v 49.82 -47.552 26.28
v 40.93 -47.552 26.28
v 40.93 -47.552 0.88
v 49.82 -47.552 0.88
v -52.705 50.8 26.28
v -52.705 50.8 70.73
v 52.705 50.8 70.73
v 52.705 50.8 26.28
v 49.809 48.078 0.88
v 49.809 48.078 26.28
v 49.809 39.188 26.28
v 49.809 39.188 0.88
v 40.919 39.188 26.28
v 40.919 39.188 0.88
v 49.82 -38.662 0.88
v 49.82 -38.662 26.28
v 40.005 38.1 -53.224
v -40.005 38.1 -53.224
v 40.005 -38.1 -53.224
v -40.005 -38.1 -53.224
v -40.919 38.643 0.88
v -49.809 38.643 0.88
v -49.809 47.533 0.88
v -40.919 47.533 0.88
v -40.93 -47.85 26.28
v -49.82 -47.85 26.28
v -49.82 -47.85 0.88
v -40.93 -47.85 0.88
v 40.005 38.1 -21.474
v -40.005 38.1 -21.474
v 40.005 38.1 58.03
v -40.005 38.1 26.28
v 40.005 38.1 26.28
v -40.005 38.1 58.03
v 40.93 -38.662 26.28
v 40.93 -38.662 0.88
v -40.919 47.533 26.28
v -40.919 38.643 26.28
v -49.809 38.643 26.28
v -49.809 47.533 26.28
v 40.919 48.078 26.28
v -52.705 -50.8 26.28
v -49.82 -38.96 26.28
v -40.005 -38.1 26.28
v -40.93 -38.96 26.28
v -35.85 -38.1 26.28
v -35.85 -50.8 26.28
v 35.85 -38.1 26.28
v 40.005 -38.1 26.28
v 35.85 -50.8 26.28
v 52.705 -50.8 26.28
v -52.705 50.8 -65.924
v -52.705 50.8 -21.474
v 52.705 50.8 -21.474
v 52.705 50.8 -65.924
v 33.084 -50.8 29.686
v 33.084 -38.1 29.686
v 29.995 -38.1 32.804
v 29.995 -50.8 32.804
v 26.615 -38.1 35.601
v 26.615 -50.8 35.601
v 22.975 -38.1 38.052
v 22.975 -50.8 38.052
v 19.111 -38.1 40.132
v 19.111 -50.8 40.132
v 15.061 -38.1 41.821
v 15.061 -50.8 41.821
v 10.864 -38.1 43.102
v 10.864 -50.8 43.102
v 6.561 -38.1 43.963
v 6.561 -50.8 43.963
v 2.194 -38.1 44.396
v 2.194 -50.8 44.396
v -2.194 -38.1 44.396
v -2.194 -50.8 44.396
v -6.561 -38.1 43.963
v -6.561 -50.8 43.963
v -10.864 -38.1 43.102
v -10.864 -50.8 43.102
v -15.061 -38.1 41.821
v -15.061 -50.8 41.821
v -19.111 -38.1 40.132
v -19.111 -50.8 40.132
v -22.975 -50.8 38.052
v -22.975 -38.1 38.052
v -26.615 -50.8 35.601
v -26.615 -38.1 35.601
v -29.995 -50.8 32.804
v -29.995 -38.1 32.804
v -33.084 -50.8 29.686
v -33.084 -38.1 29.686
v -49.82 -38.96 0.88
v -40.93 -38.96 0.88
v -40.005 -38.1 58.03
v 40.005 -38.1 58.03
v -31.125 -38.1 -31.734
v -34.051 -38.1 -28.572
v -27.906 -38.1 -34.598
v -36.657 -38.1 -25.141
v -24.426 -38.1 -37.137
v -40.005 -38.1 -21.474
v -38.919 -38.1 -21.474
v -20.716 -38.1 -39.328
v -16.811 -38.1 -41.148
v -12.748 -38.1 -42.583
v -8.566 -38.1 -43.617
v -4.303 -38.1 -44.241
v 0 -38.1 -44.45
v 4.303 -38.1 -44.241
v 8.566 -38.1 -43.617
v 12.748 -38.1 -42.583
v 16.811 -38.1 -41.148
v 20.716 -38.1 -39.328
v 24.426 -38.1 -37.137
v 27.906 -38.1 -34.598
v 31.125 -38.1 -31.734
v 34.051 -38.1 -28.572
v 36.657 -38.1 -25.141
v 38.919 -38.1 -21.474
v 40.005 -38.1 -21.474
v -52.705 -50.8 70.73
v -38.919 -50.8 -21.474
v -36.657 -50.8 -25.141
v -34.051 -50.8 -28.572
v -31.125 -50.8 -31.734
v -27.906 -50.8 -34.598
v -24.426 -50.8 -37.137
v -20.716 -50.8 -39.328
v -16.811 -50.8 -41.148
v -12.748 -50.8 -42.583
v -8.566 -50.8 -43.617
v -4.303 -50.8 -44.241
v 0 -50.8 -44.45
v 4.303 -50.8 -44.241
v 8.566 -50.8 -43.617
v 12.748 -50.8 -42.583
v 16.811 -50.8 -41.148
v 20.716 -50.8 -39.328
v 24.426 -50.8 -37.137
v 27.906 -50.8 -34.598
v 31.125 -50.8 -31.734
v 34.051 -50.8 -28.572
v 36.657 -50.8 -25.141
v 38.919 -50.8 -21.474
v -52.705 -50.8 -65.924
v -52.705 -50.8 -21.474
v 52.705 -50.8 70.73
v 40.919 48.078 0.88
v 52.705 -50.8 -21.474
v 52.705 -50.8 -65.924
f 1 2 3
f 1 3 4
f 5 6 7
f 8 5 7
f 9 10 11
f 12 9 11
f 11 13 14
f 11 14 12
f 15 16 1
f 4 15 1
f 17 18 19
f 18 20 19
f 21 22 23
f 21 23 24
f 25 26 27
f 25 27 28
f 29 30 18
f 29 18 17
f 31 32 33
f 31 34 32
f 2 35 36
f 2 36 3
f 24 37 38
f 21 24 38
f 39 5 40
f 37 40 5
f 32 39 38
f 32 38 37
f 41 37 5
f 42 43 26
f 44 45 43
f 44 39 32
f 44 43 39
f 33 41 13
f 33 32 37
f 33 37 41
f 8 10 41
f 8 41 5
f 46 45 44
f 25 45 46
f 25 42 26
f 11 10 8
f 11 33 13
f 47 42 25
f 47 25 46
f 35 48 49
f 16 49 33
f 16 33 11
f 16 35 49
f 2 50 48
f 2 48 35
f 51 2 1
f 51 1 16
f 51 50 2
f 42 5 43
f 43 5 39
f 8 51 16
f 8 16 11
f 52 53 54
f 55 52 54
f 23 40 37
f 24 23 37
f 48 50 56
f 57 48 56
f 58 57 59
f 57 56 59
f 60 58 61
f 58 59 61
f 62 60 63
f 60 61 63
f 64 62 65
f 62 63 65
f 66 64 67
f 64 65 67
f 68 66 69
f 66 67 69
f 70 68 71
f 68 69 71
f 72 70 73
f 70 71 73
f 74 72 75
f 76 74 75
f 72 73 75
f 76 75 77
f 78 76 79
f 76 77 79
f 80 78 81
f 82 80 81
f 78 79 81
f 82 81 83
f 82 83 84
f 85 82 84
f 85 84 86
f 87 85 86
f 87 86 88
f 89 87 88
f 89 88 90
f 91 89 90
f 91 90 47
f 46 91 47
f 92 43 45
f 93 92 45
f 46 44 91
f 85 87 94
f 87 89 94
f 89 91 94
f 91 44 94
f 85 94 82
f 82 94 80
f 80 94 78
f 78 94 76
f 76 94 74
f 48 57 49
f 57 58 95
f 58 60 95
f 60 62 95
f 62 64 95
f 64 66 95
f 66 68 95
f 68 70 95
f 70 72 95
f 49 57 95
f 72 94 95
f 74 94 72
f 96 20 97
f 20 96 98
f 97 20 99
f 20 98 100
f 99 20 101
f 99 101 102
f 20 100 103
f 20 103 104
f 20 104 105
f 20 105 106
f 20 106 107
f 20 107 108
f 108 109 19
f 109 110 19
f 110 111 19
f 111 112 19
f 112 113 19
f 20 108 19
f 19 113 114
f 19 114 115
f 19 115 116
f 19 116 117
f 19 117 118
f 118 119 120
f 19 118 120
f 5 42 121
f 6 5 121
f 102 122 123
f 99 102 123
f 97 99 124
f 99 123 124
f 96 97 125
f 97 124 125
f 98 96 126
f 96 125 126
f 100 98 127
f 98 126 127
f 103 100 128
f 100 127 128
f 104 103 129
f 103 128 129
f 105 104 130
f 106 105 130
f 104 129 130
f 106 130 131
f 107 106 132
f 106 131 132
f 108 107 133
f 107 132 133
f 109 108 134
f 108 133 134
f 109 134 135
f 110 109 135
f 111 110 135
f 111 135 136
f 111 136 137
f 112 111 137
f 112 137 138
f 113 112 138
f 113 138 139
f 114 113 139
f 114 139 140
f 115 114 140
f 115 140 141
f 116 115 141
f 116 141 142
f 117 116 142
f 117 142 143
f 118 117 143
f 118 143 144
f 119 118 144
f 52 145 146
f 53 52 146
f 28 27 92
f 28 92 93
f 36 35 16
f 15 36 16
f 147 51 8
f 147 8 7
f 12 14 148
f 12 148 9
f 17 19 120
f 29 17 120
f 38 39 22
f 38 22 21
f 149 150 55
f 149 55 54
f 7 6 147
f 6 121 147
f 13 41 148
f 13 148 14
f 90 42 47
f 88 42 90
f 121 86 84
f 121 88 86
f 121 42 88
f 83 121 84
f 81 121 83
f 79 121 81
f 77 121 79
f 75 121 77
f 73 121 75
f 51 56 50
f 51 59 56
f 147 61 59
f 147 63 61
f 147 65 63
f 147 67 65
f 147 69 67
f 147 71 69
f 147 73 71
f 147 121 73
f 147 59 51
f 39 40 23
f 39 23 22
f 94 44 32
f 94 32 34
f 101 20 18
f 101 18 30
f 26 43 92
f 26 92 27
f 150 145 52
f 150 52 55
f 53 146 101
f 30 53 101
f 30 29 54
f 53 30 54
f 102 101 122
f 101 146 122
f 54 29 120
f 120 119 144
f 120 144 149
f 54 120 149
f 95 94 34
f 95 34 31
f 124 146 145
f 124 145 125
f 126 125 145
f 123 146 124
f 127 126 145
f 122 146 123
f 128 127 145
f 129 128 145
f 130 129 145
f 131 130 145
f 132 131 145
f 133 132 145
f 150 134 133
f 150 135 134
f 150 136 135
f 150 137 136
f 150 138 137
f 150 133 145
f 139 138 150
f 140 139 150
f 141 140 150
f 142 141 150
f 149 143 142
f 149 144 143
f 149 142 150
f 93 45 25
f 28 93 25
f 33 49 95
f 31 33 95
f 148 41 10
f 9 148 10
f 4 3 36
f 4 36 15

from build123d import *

# Parameters (mm, degrees)
F0_W     = 105.41
F0_H     = 44.45
F1_DEPTH = 50.8
F2_T     = -12.7
F2_2_T   = -12.7
F4_DEPTH = 25.4
F6_DEPTH = 25.4
F7_W     = 8.89
F7_H     = 8.89
F8_DEPTH = 25.4


with BuildPart() as f1:
    # F0 (on Front) → F1 (new body, symmetric)
    with BuildSketch(Plane.XZ):
        with Locations((0, 48.5045666443)):
            Rectangle(F0_W, F0_H)
    extrude(amount=F1_DEPTH, both=True)

    # F2#2
    f2_2_openings = [f1.faces().sort_by_distance(p)[0] for p in [
        (0, 0, 26.279567),
    ]]
    offset(amount=F2_2_T, openings=f2_2_openings)

    # F3 (on face) → F4 (cut)
    with BuildSketch(Plane.XZ.offset(50.8)):
        with BuildLine():
            Line((-35.8495031623, 26.2795666443), (35.8495031623, 26.2795666443))
            ThreePointArc((35.8495031623, 26.2795666443), (0, 44.45), (-35.8495031623, 26.2795666443))
        make_face()
    extrude(amount=-F4_DEPTH, mode=Mode.SUBTRACT)

    # F7 (on face) → F8 (join)
    with BuildSketch(Plane(origin=(0, 0, 26.2795666443), x_dir=(1, 0, 0), z_dir=(0, 0, -1))):
        with Locations((-45.3745031623, 43.4054770315)):
            Rectangle(F7_W, F7_H)
        with Locations((-45.3644, -43.0876925516)):
            Rectangle(F7_W, F7_H)
        with Locations((45.3745031623, 43.1071132493)):
            Rectangle(F7_W, F7_H)
        with Locations((45.3644, -43.6330601501)):
            Rectangle(F7_W, F7_H)
    extrude(amount=F8_DEPTH)


with BuildPart() as f1b:
    # F0 (on Front) → F1, piece 2 (new body, symmetric)
    with BuildSketch(Plane.XZ):
        with Locations((0, -43.69915935)):
            Rectangle(F0_W, F0_H)
    extrude(amount=F1_DEPTH, both=True)

    # F2
    f2_openings = [f1b.faces().sort_by_distance(p)[0] for p in [
        (0, 0, -21.474159),
    ]]
    offset(amount=F2_T, openings=f2_openings)

    # F5 (on face) → F6 (cut)
    with BuildSketch(Plane.XZ.offset(50.8)):
        with BuildLine():
            Line((38.9186713572, -21.47415935), (-38.9186713572, -21.47415935))
            ThreePointArc((-38.9186713572, -21.47415935), (0, -44.45), (38.9186713572, -21.47415935))
        make_face()
    extrude(amount=-F6_DEPTH, mode=Mode.SUBTRACT)


solid = Compound([f1.part, f1b.part])
